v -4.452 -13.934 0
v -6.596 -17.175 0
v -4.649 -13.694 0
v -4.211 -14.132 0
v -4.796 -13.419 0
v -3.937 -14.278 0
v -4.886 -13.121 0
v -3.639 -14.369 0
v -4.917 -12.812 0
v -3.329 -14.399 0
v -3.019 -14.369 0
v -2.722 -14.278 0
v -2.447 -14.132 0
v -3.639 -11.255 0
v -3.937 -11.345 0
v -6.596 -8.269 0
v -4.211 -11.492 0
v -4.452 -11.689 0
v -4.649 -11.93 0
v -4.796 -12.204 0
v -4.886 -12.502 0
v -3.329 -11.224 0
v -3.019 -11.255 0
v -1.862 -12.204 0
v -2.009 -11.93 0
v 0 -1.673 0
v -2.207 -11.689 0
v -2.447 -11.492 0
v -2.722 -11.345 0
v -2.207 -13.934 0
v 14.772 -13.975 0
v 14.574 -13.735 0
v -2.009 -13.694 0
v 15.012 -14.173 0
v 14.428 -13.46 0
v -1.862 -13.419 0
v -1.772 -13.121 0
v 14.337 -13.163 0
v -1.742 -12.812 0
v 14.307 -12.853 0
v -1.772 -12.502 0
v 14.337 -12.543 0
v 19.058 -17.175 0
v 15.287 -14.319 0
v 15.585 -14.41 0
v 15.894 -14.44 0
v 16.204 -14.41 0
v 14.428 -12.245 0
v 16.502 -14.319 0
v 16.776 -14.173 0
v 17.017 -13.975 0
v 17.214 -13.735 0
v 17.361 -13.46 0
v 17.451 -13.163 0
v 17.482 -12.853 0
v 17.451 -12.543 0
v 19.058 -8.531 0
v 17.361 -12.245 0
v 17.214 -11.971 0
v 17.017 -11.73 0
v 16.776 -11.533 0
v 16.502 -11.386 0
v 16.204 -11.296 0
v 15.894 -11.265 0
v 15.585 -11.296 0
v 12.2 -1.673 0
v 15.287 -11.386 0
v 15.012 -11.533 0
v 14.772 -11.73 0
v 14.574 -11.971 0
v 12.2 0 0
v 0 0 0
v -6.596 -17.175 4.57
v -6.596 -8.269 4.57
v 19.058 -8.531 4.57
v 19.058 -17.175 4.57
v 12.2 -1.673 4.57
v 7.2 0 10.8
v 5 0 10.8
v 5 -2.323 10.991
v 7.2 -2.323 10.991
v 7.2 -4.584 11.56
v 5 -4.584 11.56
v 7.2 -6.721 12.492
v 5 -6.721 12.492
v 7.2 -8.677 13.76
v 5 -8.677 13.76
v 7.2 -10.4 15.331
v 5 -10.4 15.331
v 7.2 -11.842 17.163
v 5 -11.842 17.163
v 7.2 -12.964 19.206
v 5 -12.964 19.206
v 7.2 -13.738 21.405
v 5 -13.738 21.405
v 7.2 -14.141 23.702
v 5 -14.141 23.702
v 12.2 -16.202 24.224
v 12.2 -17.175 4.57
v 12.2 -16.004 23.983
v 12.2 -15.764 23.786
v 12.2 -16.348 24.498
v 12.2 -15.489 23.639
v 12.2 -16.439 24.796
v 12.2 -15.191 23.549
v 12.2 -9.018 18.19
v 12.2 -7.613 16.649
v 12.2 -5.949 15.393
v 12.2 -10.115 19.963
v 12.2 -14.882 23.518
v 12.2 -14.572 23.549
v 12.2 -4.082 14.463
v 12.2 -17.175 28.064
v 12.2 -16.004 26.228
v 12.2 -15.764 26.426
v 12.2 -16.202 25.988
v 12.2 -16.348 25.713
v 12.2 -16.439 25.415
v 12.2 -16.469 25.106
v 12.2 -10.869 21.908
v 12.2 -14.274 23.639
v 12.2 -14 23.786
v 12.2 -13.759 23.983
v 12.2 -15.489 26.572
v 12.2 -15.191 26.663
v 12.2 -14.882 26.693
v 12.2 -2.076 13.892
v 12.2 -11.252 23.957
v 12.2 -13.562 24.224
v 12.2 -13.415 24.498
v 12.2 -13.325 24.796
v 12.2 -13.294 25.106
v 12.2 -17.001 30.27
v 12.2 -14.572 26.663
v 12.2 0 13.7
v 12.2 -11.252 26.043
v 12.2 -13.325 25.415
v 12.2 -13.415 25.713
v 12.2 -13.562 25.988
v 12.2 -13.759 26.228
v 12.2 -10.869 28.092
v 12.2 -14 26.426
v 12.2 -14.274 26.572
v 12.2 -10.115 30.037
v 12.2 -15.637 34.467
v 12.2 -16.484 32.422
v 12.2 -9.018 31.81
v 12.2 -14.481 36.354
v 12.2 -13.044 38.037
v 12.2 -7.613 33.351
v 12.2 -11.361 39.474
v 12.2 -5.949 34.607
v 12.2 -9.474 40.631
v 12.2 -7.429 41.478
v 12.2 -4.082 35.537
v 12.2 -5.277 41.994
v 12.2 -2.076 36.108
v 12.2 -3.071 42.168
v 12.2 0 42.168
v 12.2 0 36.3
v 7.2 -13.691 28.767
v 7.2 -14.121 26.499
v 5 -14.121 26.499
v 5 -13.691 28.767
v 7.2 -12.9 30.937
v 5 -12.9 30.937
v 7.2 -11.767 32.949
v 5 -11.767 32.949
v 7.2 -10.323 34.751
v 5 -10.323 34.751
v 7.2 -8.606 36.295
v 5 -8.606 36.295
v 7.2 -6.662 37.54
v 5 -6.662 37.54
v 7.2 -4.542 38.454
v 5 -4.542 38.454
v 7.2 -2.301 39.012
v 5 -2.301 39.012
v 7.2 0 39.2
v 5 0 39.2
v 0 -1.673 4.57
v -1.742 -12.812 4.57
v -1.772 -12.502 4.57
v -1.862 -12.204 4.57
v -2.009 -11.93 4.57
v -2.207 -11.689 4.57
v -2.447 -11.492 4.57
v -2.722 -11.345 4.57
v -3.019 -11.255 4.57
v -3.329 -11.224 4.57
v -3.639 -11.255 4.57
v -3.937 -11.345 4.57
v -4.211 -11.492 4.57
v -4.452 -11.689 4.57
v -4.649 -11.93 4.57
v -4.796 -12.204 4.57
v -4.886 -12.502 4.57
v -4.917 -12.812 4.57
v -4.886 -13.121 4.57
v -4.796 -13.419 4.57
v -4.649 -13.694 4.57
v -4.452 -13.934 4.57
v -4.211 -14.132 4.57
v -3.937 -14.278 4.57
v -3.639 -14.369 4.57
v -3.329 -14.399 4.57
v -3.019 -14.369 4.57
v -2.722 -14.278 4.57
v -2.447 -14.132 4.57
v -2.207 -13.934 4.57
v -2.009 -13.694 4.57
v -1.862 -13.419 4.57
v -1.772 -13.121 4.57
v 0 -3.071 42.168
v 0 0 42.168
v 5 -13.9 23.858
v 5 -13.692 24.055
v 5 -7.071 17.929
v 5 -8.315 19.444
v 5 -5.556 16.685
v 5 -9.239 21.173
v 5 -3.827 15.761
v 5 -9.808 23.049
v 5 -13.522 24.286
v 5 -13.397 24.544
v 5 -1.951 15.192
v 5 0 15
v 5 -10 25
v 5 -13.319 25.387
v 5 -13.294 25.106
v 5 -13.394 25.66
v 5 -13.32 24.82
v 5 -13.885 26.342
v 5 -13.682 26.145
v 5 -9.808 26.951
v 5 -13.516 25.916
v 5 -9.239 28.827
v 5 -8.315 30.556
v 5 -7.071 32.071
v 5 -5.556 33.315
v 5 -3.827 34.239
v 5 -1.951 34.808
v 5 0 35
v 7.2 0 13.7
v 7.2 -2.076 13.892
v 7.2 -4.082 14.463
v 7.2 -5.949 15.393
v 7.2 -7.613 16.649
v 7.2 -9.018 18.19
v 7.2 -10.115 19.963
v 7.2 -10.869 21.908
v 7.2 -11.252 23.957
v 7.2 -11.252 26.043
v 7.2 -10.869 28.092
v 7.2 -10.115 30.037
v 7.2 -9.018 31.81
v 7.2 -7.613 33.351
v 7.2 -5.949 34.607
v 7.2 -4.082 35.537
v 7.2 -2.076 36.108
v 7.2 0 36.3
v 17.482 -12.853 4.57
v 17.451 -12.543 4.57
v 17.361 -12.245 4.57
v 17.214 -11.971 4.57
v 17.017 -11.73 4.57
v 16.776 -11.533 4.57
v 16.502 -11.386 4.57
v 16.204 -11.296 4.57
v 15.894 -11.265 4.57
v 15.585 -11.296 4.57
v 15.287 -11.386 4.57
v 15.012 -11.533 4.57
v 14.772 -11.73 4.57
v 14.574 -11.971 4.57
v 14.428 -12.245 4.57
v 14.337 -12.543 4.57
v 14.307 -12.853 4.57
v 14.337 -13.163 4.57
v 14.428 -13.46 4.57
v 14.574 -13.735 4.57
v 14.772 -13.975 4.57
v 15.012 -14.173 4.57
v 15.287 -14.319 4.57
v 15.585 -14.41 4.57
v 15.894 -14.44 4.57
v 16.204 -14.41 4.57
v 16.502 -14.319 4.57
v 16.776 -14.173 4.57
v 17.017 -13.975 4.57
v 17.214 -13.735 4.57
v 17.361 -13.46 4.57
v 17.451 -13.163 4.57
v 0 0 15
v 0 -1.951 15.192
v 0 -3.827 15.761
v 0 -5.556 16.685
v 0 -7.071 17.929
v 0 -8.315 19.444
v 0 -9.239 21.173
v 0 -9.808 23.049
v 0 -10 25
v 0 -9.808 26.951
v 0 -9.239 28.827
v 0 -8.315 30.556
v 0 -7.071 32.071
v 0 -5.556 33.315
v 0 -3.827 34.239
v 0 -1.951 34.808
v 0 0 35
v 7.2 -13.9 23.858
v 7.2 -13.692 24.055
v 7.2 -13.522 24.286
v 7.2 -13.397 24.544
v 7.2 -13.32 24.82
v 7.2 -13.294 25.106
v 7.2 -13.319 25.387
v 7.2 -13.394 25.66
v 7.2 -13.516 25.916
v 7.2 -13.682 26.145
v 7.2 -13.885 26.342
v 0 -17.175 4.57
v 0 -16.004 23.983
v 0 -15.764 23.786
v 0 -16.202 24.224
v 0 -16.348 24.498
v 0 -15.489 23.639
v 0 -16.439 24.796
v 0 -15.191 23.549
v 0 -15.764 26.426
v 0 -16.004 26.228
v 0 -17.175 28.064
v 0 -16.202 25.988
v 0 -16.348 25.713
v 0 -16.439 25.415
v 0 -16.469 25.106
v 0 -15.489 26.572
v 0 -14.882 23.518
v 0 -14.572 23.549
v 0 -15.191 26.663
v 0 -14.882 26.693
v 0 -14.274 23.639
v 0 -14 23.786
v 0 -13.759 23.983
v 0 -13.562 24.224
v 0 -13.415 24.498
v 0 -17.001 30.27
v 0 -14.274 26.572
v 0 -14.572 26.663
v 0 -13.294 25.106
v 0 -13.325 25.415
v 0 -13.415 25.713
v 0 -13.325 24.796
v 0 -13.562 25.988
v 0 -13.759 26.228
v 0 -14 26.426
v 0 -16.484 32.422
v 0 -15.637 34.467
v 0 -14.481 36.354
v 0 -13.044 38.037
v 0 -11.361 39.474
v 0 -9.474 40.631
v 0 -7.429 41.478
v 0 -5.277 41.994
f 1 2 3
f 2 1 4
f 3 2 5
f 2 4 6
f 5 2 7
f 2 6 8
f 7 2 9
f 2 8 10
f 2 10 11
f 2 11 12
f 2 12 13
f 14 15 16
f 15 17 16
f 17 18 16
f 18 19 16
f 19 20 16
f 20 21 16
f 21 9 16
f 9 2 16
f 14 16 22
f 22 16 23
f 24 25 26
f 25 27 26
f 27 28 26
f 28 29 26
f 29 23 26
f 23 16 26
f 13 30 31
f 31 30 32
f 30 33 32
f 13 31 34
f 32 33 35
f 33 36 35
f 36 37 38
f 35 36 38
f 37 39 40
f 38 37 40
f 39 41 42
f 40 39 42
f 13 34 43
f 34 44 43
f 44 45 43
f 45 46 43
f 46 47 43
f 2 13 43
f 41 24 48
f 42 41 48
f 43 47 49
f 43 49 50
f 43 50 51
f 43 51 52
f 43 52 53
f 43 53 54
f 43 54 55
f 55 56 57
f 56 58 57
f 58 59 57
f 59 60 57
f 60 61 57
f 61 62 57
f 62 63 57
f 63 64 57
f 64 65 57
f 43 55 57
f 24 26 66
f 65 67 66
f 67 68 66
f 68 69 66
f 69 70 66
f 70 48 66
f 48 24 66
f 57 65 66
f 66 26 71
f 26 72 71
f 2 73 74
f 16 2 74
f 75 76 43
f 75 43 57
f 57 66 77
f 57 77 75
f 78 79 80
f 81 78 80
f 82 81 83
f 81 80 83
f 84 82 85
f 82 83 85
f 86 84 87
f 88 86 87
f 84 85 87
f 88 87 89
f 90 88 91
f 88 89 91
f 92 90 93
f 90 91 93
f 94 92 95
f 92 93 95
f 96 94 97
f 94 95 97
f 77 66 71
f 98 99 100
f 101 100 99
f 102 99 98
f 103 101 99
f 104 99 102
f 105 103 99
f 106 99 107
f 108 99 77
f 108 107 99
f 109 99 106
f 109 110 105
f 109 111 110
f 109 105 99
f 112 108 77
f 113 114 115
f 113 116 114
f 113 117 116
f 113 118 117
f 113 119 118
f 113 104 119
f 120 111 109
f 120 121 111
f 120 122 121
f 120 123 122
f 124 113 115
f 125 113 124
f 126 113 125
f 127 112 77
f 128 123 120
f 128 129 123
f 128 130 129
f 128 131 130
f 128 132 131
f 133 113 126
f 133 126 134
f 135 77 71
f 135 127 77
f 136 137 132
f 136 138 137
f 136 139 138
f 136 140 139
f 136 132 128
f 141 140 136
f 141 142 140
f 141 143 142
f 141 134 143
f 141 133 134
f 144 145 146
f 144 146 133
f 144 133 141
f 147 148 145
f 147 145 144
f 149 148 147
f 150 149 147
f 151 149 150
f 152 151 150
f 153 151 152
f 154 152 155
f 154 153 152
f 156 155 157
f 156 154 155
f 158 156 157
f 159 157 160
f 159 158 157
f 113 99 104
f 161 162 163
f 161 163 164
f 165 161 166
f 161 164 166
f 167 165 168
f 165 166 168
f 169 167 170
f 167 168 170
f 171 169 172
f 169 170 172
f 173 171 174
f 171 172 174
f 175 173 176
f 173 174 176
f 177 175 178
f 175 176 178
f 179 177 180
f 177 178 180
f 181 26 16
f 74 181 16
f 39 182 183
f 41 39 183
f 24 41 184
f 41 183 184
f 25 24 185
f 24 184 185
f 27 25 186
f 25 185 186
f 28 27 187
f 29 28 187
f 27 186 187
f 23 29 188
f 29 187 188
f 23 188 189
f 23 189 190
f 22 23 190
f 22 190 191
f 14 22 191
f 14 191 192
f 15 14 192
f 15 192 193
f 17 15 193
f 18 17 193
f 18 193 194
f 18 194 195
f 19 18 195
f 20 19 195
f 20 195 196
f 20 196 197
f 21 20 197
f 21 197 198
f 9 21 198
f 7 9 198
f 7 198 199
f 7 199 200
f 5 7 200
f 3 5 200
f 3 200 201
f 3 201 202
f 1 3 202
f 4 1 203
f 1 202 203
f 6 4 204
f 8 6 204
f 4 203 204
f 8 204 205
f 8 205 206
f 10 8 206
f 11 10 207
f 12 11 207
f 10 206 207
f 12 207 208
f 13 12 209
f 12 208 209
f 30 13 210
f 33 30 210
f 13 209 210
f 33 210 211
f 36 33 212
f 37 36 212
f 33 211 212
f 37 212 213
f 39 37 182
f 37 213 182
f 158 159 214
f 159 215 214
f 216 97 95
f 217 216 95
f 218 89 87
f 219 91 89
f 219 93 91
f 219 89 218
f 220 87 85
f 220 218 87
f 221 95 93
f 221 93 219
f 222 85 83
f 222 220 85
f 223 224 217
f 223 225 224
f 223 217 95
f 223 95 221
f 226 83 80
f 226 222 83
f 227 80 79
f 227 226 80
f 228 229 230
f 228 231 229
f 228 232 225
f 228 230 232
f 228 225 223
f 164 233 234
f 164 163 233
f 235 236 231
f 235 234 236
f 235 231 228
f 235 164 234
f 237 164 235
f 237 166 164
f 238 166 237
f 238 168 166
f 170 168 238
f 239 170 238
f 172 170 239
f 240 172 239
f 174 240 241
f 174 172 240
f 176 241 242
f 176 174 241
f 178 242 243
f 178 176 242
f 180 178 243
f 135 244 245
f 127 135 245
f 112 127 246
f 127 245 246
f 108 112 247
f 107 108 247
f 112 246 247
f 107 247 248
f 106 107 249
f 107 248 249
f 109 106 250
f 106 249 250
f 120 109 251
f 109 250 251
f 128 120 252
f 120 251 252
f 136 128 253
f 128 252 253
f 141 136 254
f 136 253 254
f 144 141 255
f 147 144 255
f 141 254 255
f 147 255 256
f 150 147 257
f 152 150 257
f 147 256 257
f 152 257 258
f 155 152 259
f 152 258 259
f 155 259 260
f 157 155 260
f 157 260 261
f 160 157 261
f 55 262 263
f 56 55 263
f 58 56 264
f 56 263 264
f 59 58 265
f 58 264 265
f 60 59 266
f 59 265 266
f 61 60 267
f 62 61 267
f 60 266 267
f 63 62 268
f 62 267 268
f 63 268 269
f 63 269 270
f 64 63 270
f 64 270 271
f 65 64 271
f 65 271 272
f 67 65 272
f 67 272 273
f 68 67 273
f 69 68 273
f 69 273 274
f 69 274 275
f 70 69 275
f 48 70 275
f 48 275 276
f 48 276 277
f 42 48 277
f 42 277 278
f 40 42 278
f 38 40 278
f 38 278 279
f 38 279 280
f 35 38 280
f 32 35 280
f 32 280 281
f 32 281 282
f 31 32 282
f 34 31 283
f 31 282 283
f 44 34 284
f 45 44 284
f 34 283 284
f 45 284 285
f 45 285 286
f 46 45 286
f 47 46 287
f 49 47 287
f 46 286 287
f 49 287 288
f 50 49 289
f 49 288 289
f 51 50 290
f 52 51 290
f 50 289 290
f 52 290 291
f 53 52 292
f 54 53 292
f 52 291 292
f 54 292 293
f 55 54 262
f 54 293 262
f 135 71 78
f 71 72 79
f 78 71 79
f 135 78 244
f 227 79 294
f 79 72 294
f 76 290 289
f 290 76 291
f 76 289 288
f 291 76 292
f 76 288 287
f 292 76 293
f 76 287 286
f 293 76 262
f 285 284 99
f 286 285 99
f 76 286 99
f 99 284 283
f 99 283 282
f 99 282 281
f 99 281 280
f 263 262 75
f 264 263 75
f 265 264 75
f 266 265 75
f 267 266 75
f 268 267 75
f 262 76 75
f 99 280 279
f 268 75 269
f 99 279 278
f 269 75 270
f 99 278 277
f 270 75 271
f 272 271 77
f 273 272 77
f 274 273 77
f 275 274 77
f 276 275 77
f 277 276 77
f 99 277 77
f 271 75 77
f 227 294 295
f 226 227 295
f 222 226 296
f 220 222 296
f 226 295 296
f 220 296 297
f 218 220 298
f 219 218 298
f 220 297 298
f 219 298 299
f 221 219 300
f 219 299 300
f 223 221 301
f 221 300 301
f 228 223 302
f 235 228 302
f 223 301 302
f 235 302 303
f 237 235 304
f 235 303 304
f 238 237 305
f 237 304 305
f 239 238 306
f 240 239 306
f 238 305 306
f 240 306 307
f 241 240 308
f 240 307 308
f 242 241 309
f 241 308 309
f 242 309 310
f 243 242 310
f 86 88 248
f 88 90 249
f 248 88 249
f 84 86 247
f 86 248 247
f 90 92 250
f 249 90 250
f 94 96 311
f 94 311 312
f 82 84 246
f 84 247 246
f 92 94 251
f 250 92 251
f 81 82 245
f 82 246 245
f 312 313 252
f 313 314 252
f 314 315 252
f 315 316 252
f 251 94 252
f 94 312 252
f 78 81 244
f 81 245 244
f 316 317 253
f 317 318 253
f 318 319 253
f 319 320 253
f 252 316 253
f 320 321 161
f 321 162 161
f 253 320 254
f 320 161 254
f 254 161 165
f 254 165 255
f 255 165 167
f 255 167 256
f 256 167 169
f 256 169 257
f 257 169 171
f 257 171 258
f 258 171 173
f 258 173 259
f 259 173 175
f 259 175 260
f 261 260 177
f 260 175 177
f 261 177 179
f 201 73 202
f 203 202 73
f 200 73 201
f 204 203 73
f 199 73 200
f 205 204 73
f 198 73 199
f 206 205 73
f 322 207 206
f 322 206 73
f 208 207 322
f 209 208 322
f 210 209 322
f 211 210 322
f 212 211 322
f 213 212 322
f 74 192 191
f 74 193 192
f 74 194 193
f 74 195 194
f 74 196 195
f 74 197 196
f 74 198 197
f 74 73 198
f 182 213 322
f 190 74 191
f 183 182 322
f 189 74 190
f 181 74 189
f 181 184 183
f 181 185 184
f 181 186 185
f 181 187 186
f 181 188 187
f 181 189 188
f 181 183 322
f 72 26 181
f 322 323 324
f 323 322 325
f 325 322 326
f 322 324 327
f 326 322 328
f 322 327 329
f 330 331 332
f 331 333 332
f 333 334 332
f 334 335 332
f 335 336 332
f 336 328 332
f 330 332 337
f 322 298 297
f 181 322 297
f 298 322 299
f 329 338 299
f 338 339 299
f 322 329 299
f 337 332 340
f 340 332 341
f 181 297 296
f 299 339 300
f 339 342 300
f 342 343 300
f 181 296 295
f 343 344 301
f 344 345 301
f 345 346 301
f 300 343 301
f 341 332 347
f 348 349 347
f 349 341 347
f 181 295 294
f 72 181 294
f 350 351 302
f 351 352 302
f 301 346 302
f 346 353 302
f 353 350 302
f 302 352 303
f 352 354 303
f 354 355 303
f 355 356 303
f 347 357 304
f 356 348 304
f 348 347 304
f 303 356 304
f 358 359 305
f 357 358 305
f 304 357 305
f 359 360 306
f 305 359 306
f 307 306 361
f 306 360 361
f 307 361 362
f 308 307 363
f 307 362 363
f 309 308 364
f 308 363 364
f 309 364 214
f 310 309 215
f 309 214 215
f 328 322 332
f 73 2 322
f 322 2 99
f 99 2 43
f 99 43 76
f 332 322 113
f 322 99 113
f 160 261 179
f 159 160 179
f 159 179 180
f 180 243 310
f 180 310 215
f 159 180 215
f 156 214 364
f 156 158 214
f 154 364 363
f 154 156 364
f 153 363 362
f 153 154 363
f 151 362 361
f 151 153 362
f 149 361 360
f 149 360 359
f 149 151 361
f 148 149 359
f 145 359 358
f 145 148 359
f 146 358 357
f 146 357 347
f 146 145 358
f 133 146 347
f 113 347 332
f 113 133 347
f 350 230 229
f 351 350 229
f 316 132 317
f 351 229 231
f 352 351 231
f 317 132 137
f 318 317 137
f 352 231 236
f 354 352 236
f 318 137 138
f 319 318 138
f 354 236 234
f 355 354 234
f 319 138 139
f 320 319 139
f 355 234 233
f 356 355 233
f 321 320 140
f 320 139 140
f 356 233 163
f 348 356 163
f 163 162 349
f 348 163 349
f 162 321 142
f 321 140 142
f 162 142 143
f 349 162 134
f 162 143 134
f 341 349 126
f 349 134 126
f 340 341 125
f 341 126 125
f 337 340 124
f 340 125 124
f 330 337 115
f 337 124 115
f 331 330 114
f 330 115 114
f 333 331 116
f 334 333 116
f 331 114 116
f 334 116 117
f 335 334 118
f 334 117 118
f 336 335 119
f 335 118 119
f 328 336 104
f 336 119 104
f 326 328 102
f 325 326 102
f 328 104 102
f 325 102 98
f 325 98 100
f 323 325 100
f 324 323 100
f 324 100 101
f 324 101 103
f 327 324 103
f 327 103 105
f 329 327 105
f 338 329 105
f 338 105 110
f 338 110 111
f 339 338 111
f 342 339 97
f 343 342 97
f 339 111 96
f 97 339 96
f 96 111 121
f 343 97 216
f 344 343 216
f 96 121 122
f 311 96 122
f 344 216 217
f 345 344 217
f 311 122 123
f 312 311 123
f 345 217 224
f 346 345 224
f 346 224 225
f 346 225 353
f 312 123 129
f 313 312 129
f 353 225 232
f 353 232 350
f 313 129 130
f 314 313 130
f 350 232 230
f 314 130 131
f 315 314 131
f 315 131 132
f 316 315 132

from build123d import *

# Parameters (mm, degrees)
F1_DEPTH     = 5
F3_DEPTH     = 2.2
F5_DEPTH     = 5
F6_R         = 14.1038356314
F7_W         = 8.643694222
F7_H         = 4.569907207
F8_DEPTH     = 6.858
F10_DEPTH    = 25.654
F9_R         = 1.5875
F11_DEPTH    = 26.924
F12_R        = 1.5875
F13_DEPTH    = 9.5758
F14_T4_DEPTH = 4.569907207
F14_T9_DEPTH = 4.569907207
F15_R        = 1.5875
F16_DEPTH    = 18.034


# Not quite as in the source:
# - a fillet or chamfer that OpenCascade refuses, or shapes differently, is made with other operations: its cross-section is extruded or revolved along the edge and cut away or added


with BuildPart() as f1:
    # F0 (on Right) → F1 (new body)
    with BuildSketch(Plane.YZ):
        with BuildLine():
            Line((-17.1746751294, 0), (0, 0))
            Line((0, 0), (0, 15))
            ThreePointArc((0, 15), (-10, 25), (0, 35))
            Line((0, 35), (0, 42.1679355204))
            Line((0, 42.1679355204), (-17.1746751294, 42.1679355204))
            Line((-17.1746751294, 42.1679355204), (-17.1746751294, 0))
        make_face()
    extrude(amount=F1_DEPTH)

    # F2 (on face) → F3 (join)
    with BuildSketch(Plane.YZ.offset(5)):
        with BuildLine():
            ThreePointArc((0, 10.8), (-14.2, 25), (0, 39.2))
            Line((0, 39.2), (0, 42.1679355204))
            Line((0, 42.1679355204), (-17.1746751294, 42.1679355204))
            Line((-17.1746751294, 42.1679355204), (-17.1746751294, 0))
            Line((-17.1746751294, 0), (0, 0))
            Line((0, 0), (0, 10.8))
        make_face()
    extrude(amount=F3_DEPTH)

    # F4 (on face) → F5 (join)
    with BuildSketch(Plane.YZ.offset(7.2)):
        with BuildLine():
            ThreePointArc((0, 10.8), (-14.2, 25), (0, 39.2))
            Line((0, 39.2), (0, 42.1679355204))
            Line((0, 42.1679355204), (-17.1746751294, 42.1679355204))
            Line((-17.1746751294, 42.1679355204), (-17.1746751294, 0))
            Line((-17.1746751294, 0), (0, 0))
            Line((0, 0), (0, 10.8))
        make_face()
        with BuildLine():
            ThreePointArc((0, 13.7), (-11.3, 25), (0, 36.3))
            Line((0, 36.3), (0, 39.2))
            ThreePointArc((0, 39.2), (-14.2, 25), (0, 10.8))
            Line((0, 10.8), (0, 13.7))
        make_face()
    extrude(amount=F5_DEPTH)

    # F6
    f6_edges = [f1.edges().sort_by_distance(p)[0] for p in [
        (6.1, -17.174675, 42.167936),
    ]]
    fillet(f6_edges, radius=F6_R)

    # F7 (on face) → F8 (join)
    with BuildSketch(Plane.YZ.offset(12.2)):
        with Locations((-12.8528280184, 2.2849536035)):
            Rectangle(F7_W, F7_H)
    extrude(amount=F8_DEPTH)

    # F10 (add): a face of the model
    f10_faces = [f1.faces().sort_by_distance(p)[0] for p in [
        (19.058, -12.8528280184, 2.2849536035),
    ]]
    extrude(f10_faces, amount=-F10_DEPTH)

    # F9 (on face) → F11 (cut)
    with BuildSketch(Plane.XY.offset(4.569907207)):
        with Locations((15.894247219, -12.8528280184)):
            Circle(F9_R)
    extrude(amount=-F11_DEPTH, mode=Mode.SUBTRACT)

    # F12 (on face) → F13 (cut)
    with BuildSketch(Plane.XY.offset(4.569907207)):
        with Locations((-3.329155501, -12.8116961569)):
            Circle(F12_R)
    extrude(amount=-F13_DEPTH, mode=Mode.SUBTRACT)

    # F14: chamfer of 6.858 on 2 edges, made by hand


with BuildPart() as f14_tool2:
    # F14_s3 → F14_t4 (new body)
    with BuildSketch(Plane.XY):
        Polygon((12.2, -1.6729809074), (19.058, -8.5309809074), (12.2, -8.5309809074), align=None)
    extrude(amount=F14_T4_DEPTH)

    split(bisect_by=Plane.YZ.offset(19.058), keep=Keep.BOTTOM)


with BuildPart() as f1_1:
    add(f1.part)

    # F14_t1: union F14_tool2
    add(f14_tool2.part)


with BuildPart() as f14_tool7:
    # F14_s8 → F14_t9 (new body)
    with BuildSketch(Plane.XY):
        Polygon((0, -1.6729809074), (-6.858, -8.5309809074), (0, -8.5309809074), align=None)
    extrude(amount=F14_T9_DEPTH)

    split(bisect_by=Plane.YZ.offset(-6.596), keep=Keep.TOP)


with BuildPart() as f1_2:
    add(f1_1.part)

    # F14_t6: union F14_tool7
    add(f14_tool7.part)

    # F15 (on face) → F16 (cut)
    with BuildSketch(Plane.YZ.offset(12.2)):
        with Locations((-14.881552197, 25.1055490226)):
            Circle(F15_R)
    extrude(amount=-F16_DEPTH, mode=Mode.SUBTRACT)


solid = f1_2.part
